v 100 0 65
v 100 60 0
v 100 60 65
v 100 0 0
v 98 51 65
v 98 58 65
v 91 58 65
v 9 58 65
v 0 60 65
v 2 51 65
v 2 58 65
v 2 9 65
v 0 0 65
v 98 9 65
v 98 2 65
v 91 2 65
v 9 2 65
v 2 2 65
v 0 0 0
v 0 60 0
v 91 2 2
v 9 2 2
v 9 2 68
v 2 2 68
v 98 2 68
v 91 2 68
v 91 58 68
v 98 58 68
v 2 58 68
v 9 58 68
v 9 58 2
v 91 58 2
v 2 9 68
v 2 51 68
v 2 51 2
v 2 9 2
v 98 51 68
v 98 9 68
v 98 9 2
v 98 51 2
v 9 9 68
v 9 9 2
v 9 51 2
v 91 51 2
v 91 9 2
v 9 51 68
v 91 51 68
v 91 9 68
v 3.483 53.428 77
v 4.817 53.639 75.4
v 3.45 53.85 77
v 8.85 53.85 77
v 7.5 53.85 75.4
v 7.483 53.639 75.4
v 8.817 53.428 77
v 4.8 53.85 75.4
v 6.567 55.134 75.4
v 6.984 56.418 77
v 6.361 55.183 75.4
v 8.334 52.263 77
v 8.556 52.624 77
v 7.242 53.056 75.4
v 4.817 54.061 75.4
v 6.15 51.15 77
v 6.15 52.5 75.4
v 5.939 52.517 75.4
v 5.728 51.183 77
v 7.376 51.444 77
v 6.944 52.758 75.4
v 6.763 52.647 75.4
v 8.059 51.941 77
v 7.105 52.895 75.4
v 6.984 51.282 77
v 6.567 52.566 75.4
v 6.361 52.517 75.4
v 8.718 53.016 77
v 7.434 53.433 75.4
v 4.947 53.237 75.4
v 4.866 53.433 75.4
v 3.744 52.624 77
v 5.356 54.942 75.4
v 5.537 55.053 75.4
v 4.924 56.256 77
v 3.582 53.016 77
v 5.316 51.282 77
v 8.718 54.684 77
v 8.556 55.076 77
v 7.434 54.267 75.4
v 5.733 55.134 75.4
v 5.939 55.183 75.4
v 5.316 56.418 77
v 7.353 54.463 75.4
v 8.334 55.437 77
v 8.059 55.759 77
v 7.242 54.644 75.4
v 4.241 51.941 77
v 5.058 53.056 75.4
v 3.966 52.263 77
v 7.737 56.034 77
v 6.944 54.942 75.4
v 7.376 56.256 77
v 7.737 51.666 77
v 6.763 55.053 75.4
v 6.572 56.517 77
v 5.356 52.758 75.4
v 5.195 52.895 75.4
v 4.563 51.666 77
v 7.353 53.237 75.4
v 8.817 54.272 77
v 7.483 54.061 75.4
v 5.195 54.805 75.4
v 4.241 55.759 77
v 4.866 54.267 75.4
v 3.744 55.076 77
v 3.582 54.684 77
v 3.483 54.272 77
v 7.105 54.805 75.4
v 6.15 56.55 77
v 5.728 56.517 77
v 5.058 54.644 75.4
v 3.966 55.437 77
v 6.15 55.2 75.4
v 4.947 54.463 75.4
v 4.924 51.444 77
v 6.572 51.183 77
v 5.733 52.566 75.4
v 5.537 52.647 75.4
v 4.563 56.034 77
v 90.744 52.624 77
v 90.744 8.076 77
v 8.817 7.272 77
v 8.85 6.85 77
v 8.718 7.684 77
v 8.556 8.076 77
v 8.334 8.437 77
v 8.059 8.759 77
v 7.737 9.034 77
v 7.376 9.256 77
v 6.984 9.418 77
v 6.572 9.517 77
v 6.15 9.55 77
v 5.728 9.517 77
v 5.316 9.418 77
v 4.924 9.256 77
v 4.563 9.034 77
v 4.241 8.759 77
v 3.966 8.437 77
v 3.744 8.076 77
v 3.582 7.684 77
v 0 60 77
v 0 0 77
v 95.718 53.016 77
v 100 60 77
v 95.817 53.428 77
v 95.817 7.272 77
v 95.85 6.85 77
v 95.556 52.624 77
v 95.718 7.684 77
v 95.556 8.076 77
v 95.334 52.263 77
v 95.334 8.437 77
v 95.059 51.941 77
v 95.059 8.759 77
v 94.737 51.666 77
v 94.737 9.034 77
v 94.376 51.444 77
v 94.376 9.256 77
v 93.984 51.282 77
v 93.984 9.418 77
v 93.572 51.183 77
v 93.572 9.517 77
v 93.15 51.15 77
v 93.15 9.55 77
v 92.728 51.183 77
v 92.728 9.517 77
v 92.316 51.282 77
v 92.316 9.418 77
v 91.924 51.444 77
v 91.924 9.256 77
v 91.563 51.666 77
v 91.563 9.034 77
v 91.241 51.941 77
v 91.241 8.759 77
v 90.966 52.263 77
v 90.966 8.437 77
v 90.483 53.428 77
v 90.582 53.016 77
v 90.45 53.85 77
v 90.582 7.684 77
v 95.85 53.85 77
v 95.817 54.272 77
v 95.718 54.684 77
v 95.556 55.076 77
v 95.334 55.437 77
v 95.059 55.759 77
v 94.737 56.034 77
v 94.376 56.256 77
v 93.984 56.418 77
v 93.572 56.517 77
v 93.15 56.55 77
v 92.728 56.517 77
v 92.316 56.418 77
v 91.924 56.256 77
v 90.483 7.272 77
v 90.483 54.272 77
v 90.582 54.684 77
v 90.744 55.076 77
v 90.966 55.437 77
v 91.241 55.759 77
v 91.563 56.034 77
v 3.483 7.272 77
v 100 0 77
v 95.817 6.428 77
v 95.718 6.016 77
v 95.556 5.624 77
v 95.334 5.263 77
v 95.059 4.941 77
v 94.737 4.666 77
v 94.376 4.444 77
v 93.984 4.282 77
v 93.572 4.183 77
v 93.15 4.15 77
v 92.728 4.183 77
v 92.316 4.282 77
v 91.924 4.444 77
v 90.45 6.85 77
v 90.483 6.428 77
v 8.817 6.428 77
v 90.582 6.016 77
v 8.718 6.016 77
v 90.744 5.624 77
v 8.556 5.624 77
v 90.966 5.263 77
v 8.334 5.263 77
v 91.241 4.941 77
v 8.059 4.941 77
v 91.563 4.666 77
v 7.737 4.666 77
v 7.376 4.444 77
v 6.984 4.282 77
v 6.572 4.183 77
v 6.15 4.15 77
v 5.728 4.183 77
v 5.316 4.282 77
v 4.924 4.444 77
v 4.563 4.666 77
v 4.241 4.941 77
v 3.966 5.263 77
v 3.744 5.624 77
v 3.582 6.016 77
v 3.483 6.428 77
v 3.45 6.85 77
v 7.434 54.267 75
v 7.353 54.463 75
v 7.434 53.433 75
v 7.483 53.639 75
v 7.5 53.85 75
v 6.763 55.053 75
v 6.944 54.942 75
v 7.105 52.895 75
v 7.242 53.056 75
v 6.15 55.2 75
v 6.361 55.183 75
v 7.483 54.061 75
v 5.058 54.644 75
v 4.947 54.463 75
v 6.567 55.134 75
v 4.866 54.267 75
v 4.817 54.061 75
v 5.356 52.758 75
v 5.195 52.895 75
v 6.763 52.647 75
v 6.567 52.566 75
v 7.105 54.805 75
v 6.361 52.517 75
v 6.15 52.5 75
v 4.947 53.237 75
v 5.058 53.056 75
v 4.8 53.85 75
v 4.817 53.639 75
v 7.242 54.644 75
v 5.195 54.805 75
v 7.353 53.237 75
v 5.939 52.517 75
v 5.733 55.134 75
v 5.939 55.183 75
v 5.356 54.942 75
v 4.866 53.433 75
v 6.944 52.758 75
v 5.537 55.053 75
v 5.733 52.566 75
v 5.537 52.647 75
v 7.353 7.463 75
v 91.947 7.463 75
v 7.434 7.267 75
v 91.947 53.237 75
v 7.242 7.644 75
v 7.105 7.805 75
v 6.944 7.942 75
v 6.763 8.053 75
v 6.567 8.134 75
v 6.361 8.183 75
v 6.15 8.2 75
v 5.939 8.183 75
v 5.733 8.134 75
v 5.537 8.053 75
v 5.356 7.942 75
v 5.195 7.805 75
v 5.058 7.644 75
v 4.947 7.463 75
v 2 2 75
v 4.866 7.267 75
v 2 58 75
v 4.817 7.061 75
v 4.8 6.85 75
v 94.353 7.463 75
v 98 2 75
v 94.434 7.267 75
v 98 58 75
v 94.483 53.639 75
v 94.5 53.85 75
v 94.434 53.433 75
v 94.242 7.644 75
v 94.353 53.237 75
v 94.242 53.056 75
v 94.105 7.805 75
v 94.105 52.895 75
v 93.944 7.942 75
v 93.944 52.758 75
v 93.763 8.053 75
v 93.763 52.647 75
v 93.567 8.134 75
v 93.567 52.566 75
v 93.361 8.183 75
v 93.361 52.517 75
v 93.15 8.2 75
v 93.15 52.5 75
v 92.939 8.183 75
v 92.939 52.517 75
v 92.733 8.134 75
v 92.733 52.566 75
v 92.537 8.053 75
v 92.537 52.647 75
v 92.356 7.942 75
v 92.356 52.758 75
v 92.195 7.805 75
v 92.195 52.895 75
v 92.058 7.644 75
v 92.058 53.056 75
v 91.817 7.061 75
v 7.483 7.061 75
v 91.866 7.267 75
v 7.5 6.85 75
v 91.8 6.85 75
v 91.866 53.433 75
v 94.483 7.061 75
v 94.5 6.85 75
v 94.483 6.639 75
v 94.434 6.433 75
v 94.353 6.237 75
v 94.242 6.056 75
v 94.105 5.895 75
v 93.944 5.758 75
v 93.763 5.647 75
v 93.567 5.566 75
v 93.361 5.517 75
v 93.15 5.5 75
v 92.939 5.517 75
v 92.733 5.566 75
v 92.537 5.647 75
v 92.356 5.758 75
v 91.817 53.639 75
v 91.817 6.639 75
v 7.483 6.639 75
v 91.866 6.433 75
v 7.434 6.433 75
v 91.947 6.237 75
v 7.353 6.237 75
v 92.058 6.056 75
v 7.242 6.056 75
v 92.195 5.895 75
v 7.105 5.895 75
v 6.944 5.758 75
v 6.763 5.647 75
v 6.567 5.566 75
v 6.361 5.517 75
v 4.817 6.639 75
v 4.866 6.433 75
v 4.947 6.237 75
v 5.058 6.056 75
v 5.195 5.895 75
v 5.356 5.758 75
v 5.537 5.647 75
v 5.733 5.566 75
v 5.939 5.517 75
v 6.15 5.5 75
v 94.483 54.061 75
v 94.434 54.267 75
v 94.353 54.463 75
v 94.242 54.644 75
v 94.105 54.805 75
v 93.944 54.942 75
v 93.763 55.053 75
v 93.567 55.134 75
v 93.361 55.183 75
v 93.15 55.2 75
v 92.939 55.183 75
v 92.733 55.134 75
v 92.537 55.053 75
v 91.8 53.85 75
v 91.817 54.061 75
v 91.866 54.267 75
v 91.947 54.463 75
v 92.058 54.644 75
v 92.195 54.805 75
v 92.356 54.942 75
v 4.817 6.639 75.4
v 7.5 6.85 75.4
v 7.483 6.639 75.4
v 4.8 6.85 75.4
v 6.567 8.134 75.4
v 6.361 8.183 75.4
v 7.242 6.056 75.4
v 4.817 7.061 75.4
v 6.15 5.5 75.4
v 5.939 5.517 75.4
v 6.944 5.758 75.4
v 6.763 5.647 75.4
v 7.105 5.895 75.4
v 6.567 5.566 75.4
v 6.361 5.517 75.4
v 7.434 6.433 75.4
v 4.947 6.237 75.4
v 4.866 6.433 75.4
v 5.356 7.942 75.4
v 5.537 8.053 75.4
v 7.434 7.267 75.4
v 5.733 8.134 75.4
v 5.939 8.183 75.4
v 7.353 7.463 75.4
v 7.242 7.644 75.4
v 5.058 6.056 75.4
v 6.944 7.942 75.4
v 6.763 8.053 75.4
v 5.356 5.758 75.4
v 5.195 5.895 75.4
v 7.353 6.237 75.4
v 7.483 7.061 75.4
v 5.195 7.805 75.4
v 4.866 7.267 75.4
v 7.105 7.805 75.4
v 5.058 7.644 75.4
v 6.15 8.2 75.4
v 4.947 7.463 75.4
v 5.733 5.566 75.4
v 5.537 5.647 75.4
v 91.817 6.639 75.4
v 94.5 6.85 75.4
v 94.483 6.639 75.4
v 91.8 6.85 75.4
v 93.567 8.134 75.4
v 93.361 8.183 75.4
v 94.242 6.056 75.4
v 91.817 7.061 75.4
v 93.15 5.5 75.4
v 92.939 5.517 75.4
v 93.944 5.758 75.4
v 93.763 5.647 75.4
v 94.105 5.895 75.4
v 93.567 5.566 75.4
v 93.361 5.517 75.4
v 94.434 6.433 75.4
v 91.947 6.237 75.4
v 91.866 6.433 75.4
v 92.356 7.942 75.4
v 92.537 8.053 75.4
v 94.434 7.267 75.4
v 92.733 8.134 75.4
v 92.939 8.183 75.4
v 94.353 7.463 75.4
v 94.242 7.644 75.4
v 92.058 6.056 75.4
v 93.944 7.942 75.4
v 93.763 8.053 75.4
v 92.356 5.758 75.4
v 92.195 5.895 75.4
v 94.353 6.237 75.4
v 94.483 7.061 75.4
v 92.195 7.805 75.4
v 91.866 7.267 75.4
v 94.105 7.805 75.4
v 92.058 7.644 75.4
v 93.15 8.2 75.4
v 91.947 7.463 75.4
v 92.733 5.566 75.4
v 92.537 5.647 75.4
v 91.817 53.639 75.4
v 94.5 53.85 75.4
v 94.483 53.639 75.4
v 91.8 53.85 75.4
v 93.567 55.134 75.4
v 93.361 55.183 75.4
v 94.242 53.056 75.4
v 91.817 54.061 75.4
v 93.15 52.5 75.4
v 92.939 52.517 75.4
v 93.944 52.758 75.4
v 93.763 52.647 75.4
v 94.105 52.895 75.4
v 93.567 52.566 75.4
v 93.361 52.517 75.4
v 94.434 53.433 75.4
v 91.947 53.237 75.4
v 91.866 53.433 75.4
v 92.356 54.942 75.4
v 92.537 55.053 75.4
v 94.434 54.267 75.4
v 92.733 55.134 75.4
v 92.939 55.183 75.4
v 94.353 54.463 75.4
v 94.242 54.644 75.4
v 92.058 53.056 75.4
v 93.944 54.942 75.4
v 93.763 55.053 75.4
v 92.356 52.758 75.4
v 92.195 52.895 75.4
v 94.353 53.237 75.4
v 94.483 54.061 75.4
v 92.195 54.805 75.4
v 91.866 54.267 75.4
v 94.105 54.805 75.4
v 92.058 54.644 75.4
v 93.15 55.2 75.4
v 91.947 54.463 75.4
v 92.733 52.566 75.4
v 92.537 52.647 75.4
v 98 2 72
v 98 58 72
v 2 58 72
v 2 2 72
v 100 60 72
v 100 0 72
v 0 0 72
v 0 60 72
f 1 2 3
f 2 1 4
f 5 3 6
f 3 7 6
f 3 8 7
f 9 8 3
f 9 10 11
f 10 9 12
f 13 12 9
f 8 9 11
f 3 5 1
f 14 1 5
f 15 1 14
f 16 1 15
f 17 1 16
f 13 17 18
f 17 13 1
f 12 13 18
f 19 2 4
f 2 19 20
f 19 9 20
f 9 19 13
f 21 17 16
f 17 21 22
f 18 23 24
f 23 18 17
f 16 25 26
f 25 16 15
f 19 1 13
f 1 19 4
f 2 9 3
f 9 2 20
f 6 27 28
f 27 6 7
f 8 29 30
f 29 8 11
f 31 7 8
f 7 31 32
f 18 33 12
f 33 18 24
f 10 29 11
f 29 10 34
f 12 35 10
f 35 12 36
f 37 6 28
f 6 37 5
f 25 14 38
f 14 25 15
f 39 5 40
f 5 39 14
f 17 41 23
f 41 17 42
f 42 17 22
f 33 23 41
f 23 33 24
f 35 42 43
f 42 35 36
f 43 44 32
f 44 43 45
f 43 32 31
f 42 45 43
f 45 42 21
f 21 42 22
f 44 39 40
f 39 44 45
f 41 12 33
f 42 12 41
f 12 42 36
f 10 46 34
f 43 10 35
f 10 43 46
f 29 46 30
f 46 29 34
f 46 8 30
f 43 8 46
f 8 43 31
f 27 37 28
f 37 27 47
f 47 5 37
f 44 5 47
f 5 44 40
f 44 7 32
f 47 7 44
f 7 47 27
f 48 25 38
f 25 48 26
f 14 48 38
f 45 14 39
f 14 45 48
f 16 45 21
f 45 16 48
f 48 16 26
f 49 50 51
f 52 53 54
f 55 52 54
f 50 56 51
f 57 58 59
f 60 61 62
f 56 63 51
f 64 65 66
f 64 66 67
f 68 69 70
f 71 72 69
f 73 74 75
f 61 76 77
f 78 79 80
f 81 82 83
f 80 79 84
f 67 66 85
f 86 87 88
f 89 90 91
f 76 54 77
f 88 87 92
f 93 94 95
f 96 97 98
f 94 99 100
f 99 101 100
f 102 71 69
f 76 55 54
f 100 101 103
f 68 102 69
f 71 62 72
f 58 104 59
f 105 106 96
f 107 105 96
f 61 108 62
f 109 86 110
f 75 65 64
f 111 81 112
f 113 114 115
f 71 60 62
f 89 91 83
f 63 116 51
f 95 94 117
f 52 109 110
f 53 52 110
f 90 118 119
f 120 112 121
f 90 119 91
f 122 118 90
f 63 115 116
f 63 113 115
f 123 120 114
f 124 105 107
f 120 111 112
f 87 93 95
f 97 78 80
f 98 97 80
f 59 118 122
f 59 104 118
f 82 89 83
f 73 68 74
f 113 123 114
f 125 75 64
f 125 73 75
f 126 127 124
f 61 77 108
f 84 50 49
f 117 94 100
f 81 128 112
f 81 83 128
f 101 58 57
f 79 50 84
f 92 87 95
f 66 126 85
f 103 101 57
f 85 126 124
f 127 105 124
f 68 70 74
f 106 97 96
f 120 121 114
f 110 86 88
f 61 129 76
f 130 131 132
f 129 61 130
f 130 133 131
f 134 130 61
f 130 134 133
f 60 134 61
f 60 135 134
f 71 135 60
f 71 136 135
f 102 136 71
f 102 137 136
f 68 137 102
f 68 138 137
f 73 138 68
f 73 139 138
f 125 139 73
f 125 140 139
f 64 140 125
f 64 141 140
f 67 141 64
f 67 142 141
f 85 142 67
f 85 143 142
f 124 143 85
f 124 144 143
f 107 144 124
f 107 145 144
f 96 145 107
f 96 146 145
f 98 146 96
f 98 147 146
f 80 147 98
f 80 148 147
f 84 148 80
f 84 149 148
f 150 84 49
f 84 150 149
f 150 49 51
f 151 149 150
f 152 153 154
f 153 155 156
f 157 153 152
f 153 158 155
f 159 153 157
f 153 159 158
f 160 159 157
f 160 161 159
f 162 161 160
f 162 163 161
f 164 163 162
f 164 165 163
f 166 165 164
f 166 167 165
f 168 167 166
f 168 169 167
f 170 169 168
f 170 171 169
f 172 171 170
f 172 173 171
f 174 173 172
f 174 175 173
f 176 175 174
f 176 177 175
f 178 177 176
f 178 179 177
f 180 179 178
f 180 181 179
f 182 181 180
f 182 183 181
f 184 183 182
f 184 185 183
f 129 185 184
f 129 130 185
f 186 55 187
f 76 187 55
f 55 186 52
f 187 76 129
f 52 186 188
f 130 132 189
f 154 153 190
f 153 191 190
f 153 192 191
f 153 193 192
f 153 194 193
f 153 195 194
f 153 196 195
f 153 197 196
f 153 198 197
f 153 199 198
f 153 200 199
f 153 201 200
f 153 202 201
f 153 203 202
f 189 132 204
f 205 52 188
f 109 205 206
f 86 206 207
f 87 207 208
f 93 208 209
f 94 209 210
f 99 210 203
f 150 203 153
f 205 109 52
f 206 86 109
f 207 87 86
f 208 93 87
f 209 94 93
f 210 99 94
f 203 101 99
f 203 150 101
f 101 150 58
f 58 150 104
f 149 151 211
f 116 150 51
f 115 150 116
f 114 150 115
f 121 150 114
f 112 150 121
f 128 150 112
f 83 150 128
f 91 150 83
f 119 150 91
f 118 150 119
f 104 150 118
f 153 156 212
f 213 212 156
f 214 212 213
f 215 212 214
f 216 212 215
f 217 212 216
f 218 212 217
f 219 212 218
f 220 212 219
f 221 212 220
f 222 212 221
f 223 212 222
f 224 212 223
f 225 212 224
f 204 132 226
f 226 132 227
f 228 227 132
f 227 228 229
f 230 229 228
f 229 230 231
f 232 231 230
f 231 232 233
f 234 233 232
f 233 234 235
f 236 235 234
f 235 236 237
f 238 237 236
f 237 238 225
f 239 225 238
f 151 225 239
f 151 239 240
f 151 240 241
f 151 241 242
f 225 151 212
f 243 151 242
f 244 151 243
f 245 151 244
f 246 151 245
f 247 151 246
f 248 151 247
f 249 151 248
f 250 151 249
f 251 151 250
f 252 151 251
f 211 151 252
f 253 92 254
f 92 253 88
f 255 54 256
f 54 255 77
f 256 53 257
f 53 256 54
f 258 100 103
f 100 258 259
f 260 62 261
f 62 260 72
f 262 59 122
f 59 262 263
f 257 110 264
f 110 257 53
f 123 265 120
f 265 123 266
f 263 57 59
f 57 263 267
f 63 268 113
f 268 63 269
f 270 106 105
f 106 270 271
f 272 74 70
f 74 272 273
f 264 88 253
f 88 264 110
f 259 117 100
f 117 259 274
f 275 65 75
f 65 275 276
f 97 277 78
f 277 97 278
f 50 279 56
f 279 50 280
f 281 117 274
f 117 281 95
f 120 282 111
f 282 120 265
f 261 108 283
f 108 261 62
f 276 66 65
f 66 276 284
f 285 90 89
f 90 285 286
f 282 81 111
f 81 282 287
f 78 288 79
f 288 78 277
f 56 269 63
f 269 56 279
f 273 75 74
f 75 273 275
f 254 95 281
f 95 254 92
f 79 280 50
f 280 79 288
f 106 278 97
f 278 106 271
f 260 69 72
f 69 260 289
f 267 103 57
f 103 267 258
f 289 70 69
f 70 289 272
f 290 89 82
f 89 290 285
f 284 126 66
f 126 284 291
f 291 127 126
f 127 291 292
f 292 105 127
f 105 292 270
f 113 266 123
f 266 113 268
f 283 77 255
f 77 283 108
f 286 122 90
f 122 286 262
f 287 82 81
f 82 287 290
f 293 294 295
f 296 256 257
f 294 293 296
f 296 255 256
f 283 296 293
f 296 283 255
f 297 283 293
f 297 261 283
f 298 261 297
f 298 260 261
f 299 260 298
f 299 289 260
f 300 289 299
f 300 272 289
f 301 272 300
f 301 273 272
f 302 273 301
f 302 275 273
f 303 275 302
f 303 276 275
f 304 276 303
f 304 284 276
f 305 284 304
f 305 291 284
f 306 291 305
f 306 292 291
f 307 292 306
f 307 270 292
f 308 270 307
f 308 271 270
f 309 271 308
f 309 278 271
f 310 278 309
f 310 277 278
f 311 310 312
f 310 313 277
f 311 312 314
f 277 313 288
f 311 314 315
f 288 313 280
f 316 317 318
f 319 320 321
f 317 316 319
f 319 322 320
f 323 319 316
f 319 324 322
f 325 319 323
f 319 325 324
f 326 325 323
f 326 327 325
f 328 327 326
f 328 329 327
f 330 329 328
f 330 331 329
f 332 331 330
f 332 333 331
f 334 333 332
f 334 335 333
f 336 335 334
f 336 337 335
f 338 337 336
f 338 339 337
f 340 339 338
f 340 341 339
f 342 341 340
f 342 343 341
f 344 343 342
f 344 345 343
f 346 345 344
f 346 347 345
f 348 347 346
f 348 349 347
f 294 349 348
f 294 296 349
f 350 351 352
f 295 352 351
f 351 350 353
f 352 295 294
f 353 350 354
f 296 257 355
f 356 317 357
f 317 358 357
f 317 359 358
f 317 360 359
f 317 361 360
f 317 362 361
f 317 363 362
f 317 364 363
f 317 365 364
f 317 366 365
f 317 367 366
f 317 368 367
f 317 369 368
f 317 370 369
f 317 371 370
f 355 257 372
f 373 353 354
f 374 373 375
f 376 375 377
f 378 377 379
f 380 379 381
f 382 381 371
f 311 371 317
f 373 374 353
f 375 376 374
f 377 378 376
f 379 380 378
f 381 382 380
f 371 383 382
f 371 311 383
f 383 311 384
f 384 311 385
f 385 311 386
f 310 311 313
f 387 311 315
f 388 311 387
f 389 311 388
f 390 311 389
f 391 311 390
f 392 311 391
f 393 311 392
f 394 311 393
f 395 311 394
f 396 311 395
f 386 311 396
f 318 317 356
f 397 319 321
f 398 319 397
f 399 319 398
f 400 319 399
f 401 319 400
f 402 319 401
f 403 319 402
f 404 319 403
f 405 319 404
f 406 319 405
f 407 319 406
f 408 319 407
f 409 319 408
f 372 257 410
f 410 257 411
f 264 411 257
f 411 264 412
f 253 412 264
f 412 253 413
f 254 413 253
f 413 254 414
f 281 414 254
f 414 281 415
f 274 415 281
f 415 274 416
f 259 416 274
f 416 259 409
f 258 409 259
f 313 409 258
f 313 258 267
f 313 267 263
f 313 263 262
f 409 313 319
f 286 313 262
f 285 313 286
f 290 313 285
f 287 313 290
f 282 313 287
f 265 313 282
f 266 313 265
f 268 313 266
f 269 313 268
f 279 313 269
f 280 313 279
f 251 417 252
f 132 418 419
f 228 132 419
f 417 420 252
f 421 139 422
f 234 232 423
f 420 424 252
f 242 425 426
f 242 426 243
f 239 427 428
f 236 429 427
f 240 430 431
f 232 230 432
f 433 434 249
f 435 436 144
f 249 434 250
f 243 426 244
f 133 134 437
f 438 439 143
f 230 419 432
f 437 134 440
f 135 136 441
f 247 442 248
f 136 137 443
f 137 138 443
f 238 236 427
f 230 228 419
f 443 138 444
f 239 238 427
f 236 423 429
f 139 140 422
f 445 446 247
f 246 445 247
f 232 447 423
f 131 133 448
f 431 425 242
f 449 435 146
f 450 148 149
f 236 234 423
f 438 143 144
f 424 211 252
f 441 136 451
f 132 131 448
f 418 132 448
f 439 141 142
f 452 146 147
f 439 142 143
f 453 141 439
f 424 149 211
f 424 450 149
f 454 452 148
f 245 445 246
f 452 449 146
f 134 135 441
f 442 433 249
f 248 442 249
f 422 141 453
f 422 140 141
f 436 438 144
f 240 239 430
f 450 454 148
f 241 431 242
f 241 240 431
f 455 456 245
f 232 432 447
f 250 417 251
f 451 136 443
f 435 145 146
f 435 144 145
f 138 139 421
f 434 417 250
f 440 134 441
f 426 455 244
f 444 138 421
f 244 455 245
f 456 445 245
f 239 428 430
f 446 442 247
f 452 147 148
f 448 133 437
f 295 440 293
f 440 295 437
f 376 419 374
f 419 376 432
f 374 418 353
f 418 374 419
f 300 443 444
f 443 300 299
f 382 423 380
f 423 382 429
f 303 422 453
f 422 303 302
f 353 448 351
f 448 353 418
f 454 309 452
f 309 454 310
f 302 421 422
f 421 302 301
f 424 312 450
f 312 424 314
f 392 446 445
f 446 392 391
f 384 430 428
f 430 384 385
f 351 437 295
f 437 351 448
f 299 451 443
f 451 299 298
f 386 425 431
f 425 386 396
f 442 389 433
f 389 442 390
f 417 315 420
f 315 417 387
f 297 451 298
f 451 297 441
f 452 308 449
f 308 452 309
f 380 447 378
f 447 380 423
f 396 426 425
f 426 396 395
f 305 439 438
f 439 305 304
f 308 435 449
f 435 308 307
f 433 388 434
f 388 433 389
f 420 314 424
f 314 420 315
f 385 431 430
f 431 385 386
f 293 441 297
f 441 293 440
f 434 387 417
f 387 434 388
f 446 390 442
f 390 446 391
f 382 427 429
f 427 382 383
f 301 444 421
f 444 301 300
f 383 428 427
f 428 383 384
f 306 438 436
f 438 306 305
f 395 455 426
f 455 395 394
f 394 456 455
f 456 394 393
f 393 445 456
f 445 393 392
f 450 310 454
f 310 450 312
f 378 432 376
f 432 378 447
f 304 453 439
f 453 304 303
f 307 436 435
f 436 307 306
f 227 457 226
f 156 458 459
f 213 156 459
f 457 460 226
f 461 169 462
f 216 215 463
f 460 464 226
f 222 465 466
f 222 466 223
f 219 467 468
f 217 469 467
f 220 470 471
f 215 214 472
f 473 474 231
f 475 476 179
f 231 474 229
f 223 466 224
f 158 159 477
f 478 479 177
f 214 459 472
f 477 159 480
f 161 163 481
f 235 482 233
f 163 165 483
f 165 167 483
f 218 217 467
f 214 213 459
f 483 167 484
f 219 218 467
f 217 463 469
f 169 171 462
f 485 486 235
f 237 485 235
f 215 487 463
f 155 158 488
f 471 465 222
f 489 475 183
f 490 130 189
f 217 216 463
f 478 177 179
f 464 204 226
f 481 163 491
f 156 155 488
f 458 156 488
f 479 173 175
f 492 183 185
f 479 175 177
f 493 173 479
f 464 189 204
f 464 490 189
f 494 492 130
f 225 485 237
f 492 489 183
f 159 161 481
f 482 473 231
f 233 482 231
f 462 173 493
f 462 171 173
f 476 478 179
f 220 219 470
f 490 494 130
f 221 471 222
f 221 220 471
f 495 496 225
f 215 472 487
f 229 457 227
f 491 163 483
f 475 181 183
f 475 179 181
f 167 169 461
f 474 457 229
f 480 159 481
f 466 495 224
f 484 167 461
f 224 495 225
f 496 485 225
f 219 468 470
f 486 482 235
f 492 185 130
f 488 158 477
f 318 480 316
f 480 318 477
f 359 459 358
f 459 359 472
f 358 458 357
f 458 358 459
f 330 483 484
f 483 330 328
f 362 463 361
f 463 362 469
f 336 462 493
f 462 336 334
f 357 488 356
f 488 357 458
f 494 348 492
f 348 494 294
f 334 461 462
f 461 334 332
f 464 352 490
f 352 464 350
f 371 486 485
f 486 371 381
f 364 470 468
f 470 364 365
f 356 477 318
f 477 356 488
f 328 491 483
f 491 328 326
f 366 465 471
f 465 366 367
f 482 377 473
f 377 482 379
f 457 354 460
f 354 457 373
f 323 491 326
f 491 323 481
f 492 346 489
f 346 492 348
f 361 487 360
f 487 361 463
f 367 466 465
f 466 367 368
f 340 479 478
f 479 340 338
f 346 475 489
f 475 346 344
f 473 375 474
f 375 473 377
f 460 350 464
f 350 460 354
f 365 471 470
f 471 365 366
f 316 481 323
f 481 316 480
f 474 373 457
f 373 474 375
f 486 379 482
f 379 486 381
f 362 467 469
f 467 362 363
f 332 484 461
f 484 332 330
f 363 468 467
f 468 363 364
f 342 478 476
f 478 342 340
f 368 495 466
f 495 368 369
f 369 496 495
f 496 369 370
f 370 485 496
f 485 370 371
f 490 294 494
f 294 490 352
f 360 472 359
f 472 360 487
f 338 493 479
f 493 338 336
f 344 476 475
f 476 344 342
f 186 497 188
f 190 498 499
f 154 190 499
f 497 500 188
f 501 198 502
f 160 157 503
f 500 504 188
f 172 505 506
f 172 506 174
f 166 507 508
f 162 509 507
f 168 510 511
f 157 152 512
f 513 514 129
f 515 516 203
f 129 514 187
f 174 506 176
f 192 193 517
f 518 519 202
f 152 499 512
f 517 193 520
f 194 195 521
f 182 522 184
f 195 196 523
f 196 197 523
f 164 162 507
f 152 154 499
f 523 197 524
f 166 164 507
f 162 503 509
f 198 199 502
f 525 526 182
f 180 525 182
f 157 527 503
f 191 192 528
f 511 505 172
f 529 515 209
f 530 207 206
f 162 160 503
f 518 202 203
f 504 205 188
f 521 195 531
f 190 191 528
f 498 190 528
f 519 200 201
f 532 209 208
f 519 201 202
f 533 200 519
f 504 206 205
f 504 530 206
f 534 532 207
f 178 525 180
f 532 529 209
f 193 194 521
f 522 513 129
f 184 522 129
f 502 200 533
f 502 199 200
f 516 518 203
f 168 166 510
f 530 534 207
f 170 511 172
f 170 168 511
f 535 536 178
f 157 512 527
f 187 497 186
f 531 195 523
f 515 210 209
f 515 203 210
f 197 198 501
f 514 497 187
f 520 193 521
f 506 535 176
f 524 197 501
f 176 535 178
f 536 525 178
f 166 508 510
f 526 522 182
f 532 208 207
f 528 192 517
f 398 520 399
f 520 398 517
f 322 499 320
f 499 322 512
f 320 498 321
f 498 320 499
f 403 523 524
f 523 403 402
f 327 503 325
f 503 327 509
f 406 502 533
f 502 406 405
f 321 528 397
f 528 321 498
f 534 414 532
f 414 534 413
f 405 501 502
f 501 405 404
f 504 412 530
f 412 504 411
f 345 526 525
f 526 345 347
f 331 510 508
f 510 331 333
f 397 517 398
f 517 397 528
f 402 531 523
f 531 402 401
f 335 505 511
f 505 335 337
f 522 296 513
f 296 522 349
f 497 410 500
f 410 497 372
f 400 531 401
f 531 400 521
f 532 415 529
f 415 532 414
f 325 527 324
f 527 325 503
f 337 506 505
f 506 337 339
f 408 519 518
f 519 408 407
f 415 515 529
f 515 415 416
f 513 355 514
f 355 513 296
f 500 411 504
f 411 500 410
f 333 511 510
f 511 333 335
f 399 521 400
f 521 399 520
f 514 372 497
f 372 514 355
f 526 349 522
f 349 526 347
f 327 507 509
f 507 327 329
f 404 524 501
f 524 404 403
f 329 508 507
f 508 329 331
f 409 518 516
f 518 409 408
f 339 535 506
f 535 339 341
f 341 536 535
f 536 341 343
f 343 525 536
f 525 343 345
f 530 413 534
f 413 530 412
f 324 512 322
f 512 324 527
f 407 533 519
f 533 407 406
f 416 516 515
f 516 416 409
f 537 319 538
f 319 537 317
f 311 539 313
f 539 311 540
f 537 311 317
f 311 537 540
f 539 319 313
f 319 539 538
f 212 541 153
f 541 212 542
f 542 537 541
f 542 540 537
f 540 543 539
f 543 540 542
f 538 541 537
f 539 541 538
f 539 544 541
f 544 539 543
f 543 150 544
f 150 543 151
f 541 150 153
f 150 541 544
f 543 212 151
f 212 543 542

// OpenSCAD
// -------------- Measurements -----------------
groundClearance = 3;
boardThickness = 1.7;
maxHeight = 17.4;
boardDepth = 100;
boardWidth = 200;
// mountingHoleDistanceLeftRight = mountingHoleDiameter/2 + 3.2;
// mountingHoleDistanceTopBottom = mountingHoleDistanceLeftRight;

// ------------------ Case --------------------- 

caseDistanceBoard = 2;
caseDistanceConnectors = 3;
caseThickness = 2;
caseWidth = 100;
caseDepth = 60;

rimThickness = 2;
rimCornerLength = 7;
rimOffset = 3;

caseSpacersHeight = groundClearance * 1.5;
caseSpacersThickness = 1.5;
caseBottomHeight = caseThickness + rimOffset + 60;
caseTopHeight = caseBottomHeight;

rimHeight = caseTopHeight - caseThickness + rimOffset;

countersunkBoltHoleDistance = rimCornerLength/2;
countersunkBoltHoleDiameterMin = 2.7;
countersunkBoltHoleDiameterMax = 5.4;
countersunkBoltHoleHeight = 1.6;

// ------------- Print Settings ----------------

print = false;
bottom = true; 
$fn = 40;

// ---------------- Modules --------------------

module holePuncher(diameter, height) {
  cylinder(d=diameter, h=height, center=false, $fn=20);
}

// Case - Bottom

module caseBottom() {

  translate([caseThickness, caseThickness, 0]) {

    // bottom pane 
    cube([caseWidth - 2 * caseThickness, caseDepth - 2 * caseThickness, caseThickness]);

  }

  // sides
  color("yellow") {

    // front
    cube([caseWidth, caseThickness, caseBottomHeight], center=false);
    //back
    translate([0, caseDepth - caseThickness, 0])
      cube([caseWidth, caseThickness, caseBottomHeight], center=false);
    // left  
    cube([caseThickness, caseDepth, caseBottomHeight], center=false);
    // right
    translate([caseWidth - caseThickness, 0, 0])
      cube([caseThickness, caseDepth, caseBottomHeight], center=false);
        
  }

  // corners

  color("red") {

    translate([0, 0, caseThickness]) {
      
      translate([caseThickness, caseThickness, 0])
        corner();
      translate([caseThickness, caseDepth - caseThickness, 0])
        rotate([0, 0, 270])
          corner();
      translate([caseWidth - caseThickness, caseDepth - caseThickness, 0])
        rotate([0, 0, 180])
          corner();
      translate([caseWidth - caseThickness, caseThickness, 0])
        rotate([0, 0, 90])
          corner();
      
    }
    
  }
  
}

module spacer(innerDiameter, thickness, height) {

  difference() {
    cylinder(r=(innerDiameter/2 + thickness), h=height, center = false);
    cylinder(d=innerDiameter, h=height, center = false);
  }
  
}

module countersunkBoltHole() {

  translate([-countersunkBoltHoleDiameterMin/2, -countersunkBoltHoleDiameterMin/2, 0])
  union() {
    cylinder(d1=countersunkBoltHoleDiameterMax, d2=countersunkBoltHoleDiameterMin, h=countersunkBoltHoleHeight, center = false);
    cylinder(d=countersunkBoltHoleDiameterMin, h=caseThickness, center = false);

  }
}

module caseLid() {

  difference() {

    translate([caseThickness, caseThickness, 0])
      cube([caseWidth - 2*caseThickness, caseDepth - 2*caseThickness, caseThickness]);
    
    #translate([2*caseThickness + countersunkBoltHoleDistance, 2*caseThickness + countersunkBoltHoleDistance, 0])
      countersunkBoltHole();
    #translate([2*caseThickness + countersunkBoltHoleDistance, caseDepth - (caseThickness + countersunkBoltHoleDistance), 0])
      countersunkBoltHole();
    #translate([caseWidth - (caseThickness + countersunkBoltHoleDistance), caseDepth - (caseThickness + countersunkBoltHoleDistance), 0])
      countersunkBoltHole();
    #translate([caseWidth - (caseThickness + countersunkBoltHoleDistance), 2*caseThickness + countersunkBoltHoleDistance, 0])
      countersunkBoltHole();

  }

  // sides
  color("yellow") {
      
    // front
    cube([caseWidth, caseThickness, caseThickness + rimOffset], center=false);
    //back
    translate([0, caseDepth - caseThickness, 0])
      cube([caseWidth, caseThickness, caseThickness + rimOffset], center=false);
    // left  
    cube([caseThickness, caseDepth, caseThickness + rimOffset], center=false);
    // right
    translate([caseWidth - caseThickness, 0, 0])
      cube([caseThickness, caseDepth, caseThickness + rimOffset], center=false);
        
  }
  
}

module cornerRim() {

  cube([rimCornerLength, rimThickness, rimHeight]);
  cube([rimThickness, rimCornerLength, rimHeight]);
  
} 

module corner() {

  cube([rimCornerLength, rimCornerLength, rimHeight]);
  
} 


if (print) {

  if (bottom) {
    caseBottom();
  } else {
    caseLid();
  }

} else {

  caseBottom();
  translate([0, caseDepth, caseBottomHeight + 12])
    rotate([180, 0, 0])
    caseLid();
    
}
